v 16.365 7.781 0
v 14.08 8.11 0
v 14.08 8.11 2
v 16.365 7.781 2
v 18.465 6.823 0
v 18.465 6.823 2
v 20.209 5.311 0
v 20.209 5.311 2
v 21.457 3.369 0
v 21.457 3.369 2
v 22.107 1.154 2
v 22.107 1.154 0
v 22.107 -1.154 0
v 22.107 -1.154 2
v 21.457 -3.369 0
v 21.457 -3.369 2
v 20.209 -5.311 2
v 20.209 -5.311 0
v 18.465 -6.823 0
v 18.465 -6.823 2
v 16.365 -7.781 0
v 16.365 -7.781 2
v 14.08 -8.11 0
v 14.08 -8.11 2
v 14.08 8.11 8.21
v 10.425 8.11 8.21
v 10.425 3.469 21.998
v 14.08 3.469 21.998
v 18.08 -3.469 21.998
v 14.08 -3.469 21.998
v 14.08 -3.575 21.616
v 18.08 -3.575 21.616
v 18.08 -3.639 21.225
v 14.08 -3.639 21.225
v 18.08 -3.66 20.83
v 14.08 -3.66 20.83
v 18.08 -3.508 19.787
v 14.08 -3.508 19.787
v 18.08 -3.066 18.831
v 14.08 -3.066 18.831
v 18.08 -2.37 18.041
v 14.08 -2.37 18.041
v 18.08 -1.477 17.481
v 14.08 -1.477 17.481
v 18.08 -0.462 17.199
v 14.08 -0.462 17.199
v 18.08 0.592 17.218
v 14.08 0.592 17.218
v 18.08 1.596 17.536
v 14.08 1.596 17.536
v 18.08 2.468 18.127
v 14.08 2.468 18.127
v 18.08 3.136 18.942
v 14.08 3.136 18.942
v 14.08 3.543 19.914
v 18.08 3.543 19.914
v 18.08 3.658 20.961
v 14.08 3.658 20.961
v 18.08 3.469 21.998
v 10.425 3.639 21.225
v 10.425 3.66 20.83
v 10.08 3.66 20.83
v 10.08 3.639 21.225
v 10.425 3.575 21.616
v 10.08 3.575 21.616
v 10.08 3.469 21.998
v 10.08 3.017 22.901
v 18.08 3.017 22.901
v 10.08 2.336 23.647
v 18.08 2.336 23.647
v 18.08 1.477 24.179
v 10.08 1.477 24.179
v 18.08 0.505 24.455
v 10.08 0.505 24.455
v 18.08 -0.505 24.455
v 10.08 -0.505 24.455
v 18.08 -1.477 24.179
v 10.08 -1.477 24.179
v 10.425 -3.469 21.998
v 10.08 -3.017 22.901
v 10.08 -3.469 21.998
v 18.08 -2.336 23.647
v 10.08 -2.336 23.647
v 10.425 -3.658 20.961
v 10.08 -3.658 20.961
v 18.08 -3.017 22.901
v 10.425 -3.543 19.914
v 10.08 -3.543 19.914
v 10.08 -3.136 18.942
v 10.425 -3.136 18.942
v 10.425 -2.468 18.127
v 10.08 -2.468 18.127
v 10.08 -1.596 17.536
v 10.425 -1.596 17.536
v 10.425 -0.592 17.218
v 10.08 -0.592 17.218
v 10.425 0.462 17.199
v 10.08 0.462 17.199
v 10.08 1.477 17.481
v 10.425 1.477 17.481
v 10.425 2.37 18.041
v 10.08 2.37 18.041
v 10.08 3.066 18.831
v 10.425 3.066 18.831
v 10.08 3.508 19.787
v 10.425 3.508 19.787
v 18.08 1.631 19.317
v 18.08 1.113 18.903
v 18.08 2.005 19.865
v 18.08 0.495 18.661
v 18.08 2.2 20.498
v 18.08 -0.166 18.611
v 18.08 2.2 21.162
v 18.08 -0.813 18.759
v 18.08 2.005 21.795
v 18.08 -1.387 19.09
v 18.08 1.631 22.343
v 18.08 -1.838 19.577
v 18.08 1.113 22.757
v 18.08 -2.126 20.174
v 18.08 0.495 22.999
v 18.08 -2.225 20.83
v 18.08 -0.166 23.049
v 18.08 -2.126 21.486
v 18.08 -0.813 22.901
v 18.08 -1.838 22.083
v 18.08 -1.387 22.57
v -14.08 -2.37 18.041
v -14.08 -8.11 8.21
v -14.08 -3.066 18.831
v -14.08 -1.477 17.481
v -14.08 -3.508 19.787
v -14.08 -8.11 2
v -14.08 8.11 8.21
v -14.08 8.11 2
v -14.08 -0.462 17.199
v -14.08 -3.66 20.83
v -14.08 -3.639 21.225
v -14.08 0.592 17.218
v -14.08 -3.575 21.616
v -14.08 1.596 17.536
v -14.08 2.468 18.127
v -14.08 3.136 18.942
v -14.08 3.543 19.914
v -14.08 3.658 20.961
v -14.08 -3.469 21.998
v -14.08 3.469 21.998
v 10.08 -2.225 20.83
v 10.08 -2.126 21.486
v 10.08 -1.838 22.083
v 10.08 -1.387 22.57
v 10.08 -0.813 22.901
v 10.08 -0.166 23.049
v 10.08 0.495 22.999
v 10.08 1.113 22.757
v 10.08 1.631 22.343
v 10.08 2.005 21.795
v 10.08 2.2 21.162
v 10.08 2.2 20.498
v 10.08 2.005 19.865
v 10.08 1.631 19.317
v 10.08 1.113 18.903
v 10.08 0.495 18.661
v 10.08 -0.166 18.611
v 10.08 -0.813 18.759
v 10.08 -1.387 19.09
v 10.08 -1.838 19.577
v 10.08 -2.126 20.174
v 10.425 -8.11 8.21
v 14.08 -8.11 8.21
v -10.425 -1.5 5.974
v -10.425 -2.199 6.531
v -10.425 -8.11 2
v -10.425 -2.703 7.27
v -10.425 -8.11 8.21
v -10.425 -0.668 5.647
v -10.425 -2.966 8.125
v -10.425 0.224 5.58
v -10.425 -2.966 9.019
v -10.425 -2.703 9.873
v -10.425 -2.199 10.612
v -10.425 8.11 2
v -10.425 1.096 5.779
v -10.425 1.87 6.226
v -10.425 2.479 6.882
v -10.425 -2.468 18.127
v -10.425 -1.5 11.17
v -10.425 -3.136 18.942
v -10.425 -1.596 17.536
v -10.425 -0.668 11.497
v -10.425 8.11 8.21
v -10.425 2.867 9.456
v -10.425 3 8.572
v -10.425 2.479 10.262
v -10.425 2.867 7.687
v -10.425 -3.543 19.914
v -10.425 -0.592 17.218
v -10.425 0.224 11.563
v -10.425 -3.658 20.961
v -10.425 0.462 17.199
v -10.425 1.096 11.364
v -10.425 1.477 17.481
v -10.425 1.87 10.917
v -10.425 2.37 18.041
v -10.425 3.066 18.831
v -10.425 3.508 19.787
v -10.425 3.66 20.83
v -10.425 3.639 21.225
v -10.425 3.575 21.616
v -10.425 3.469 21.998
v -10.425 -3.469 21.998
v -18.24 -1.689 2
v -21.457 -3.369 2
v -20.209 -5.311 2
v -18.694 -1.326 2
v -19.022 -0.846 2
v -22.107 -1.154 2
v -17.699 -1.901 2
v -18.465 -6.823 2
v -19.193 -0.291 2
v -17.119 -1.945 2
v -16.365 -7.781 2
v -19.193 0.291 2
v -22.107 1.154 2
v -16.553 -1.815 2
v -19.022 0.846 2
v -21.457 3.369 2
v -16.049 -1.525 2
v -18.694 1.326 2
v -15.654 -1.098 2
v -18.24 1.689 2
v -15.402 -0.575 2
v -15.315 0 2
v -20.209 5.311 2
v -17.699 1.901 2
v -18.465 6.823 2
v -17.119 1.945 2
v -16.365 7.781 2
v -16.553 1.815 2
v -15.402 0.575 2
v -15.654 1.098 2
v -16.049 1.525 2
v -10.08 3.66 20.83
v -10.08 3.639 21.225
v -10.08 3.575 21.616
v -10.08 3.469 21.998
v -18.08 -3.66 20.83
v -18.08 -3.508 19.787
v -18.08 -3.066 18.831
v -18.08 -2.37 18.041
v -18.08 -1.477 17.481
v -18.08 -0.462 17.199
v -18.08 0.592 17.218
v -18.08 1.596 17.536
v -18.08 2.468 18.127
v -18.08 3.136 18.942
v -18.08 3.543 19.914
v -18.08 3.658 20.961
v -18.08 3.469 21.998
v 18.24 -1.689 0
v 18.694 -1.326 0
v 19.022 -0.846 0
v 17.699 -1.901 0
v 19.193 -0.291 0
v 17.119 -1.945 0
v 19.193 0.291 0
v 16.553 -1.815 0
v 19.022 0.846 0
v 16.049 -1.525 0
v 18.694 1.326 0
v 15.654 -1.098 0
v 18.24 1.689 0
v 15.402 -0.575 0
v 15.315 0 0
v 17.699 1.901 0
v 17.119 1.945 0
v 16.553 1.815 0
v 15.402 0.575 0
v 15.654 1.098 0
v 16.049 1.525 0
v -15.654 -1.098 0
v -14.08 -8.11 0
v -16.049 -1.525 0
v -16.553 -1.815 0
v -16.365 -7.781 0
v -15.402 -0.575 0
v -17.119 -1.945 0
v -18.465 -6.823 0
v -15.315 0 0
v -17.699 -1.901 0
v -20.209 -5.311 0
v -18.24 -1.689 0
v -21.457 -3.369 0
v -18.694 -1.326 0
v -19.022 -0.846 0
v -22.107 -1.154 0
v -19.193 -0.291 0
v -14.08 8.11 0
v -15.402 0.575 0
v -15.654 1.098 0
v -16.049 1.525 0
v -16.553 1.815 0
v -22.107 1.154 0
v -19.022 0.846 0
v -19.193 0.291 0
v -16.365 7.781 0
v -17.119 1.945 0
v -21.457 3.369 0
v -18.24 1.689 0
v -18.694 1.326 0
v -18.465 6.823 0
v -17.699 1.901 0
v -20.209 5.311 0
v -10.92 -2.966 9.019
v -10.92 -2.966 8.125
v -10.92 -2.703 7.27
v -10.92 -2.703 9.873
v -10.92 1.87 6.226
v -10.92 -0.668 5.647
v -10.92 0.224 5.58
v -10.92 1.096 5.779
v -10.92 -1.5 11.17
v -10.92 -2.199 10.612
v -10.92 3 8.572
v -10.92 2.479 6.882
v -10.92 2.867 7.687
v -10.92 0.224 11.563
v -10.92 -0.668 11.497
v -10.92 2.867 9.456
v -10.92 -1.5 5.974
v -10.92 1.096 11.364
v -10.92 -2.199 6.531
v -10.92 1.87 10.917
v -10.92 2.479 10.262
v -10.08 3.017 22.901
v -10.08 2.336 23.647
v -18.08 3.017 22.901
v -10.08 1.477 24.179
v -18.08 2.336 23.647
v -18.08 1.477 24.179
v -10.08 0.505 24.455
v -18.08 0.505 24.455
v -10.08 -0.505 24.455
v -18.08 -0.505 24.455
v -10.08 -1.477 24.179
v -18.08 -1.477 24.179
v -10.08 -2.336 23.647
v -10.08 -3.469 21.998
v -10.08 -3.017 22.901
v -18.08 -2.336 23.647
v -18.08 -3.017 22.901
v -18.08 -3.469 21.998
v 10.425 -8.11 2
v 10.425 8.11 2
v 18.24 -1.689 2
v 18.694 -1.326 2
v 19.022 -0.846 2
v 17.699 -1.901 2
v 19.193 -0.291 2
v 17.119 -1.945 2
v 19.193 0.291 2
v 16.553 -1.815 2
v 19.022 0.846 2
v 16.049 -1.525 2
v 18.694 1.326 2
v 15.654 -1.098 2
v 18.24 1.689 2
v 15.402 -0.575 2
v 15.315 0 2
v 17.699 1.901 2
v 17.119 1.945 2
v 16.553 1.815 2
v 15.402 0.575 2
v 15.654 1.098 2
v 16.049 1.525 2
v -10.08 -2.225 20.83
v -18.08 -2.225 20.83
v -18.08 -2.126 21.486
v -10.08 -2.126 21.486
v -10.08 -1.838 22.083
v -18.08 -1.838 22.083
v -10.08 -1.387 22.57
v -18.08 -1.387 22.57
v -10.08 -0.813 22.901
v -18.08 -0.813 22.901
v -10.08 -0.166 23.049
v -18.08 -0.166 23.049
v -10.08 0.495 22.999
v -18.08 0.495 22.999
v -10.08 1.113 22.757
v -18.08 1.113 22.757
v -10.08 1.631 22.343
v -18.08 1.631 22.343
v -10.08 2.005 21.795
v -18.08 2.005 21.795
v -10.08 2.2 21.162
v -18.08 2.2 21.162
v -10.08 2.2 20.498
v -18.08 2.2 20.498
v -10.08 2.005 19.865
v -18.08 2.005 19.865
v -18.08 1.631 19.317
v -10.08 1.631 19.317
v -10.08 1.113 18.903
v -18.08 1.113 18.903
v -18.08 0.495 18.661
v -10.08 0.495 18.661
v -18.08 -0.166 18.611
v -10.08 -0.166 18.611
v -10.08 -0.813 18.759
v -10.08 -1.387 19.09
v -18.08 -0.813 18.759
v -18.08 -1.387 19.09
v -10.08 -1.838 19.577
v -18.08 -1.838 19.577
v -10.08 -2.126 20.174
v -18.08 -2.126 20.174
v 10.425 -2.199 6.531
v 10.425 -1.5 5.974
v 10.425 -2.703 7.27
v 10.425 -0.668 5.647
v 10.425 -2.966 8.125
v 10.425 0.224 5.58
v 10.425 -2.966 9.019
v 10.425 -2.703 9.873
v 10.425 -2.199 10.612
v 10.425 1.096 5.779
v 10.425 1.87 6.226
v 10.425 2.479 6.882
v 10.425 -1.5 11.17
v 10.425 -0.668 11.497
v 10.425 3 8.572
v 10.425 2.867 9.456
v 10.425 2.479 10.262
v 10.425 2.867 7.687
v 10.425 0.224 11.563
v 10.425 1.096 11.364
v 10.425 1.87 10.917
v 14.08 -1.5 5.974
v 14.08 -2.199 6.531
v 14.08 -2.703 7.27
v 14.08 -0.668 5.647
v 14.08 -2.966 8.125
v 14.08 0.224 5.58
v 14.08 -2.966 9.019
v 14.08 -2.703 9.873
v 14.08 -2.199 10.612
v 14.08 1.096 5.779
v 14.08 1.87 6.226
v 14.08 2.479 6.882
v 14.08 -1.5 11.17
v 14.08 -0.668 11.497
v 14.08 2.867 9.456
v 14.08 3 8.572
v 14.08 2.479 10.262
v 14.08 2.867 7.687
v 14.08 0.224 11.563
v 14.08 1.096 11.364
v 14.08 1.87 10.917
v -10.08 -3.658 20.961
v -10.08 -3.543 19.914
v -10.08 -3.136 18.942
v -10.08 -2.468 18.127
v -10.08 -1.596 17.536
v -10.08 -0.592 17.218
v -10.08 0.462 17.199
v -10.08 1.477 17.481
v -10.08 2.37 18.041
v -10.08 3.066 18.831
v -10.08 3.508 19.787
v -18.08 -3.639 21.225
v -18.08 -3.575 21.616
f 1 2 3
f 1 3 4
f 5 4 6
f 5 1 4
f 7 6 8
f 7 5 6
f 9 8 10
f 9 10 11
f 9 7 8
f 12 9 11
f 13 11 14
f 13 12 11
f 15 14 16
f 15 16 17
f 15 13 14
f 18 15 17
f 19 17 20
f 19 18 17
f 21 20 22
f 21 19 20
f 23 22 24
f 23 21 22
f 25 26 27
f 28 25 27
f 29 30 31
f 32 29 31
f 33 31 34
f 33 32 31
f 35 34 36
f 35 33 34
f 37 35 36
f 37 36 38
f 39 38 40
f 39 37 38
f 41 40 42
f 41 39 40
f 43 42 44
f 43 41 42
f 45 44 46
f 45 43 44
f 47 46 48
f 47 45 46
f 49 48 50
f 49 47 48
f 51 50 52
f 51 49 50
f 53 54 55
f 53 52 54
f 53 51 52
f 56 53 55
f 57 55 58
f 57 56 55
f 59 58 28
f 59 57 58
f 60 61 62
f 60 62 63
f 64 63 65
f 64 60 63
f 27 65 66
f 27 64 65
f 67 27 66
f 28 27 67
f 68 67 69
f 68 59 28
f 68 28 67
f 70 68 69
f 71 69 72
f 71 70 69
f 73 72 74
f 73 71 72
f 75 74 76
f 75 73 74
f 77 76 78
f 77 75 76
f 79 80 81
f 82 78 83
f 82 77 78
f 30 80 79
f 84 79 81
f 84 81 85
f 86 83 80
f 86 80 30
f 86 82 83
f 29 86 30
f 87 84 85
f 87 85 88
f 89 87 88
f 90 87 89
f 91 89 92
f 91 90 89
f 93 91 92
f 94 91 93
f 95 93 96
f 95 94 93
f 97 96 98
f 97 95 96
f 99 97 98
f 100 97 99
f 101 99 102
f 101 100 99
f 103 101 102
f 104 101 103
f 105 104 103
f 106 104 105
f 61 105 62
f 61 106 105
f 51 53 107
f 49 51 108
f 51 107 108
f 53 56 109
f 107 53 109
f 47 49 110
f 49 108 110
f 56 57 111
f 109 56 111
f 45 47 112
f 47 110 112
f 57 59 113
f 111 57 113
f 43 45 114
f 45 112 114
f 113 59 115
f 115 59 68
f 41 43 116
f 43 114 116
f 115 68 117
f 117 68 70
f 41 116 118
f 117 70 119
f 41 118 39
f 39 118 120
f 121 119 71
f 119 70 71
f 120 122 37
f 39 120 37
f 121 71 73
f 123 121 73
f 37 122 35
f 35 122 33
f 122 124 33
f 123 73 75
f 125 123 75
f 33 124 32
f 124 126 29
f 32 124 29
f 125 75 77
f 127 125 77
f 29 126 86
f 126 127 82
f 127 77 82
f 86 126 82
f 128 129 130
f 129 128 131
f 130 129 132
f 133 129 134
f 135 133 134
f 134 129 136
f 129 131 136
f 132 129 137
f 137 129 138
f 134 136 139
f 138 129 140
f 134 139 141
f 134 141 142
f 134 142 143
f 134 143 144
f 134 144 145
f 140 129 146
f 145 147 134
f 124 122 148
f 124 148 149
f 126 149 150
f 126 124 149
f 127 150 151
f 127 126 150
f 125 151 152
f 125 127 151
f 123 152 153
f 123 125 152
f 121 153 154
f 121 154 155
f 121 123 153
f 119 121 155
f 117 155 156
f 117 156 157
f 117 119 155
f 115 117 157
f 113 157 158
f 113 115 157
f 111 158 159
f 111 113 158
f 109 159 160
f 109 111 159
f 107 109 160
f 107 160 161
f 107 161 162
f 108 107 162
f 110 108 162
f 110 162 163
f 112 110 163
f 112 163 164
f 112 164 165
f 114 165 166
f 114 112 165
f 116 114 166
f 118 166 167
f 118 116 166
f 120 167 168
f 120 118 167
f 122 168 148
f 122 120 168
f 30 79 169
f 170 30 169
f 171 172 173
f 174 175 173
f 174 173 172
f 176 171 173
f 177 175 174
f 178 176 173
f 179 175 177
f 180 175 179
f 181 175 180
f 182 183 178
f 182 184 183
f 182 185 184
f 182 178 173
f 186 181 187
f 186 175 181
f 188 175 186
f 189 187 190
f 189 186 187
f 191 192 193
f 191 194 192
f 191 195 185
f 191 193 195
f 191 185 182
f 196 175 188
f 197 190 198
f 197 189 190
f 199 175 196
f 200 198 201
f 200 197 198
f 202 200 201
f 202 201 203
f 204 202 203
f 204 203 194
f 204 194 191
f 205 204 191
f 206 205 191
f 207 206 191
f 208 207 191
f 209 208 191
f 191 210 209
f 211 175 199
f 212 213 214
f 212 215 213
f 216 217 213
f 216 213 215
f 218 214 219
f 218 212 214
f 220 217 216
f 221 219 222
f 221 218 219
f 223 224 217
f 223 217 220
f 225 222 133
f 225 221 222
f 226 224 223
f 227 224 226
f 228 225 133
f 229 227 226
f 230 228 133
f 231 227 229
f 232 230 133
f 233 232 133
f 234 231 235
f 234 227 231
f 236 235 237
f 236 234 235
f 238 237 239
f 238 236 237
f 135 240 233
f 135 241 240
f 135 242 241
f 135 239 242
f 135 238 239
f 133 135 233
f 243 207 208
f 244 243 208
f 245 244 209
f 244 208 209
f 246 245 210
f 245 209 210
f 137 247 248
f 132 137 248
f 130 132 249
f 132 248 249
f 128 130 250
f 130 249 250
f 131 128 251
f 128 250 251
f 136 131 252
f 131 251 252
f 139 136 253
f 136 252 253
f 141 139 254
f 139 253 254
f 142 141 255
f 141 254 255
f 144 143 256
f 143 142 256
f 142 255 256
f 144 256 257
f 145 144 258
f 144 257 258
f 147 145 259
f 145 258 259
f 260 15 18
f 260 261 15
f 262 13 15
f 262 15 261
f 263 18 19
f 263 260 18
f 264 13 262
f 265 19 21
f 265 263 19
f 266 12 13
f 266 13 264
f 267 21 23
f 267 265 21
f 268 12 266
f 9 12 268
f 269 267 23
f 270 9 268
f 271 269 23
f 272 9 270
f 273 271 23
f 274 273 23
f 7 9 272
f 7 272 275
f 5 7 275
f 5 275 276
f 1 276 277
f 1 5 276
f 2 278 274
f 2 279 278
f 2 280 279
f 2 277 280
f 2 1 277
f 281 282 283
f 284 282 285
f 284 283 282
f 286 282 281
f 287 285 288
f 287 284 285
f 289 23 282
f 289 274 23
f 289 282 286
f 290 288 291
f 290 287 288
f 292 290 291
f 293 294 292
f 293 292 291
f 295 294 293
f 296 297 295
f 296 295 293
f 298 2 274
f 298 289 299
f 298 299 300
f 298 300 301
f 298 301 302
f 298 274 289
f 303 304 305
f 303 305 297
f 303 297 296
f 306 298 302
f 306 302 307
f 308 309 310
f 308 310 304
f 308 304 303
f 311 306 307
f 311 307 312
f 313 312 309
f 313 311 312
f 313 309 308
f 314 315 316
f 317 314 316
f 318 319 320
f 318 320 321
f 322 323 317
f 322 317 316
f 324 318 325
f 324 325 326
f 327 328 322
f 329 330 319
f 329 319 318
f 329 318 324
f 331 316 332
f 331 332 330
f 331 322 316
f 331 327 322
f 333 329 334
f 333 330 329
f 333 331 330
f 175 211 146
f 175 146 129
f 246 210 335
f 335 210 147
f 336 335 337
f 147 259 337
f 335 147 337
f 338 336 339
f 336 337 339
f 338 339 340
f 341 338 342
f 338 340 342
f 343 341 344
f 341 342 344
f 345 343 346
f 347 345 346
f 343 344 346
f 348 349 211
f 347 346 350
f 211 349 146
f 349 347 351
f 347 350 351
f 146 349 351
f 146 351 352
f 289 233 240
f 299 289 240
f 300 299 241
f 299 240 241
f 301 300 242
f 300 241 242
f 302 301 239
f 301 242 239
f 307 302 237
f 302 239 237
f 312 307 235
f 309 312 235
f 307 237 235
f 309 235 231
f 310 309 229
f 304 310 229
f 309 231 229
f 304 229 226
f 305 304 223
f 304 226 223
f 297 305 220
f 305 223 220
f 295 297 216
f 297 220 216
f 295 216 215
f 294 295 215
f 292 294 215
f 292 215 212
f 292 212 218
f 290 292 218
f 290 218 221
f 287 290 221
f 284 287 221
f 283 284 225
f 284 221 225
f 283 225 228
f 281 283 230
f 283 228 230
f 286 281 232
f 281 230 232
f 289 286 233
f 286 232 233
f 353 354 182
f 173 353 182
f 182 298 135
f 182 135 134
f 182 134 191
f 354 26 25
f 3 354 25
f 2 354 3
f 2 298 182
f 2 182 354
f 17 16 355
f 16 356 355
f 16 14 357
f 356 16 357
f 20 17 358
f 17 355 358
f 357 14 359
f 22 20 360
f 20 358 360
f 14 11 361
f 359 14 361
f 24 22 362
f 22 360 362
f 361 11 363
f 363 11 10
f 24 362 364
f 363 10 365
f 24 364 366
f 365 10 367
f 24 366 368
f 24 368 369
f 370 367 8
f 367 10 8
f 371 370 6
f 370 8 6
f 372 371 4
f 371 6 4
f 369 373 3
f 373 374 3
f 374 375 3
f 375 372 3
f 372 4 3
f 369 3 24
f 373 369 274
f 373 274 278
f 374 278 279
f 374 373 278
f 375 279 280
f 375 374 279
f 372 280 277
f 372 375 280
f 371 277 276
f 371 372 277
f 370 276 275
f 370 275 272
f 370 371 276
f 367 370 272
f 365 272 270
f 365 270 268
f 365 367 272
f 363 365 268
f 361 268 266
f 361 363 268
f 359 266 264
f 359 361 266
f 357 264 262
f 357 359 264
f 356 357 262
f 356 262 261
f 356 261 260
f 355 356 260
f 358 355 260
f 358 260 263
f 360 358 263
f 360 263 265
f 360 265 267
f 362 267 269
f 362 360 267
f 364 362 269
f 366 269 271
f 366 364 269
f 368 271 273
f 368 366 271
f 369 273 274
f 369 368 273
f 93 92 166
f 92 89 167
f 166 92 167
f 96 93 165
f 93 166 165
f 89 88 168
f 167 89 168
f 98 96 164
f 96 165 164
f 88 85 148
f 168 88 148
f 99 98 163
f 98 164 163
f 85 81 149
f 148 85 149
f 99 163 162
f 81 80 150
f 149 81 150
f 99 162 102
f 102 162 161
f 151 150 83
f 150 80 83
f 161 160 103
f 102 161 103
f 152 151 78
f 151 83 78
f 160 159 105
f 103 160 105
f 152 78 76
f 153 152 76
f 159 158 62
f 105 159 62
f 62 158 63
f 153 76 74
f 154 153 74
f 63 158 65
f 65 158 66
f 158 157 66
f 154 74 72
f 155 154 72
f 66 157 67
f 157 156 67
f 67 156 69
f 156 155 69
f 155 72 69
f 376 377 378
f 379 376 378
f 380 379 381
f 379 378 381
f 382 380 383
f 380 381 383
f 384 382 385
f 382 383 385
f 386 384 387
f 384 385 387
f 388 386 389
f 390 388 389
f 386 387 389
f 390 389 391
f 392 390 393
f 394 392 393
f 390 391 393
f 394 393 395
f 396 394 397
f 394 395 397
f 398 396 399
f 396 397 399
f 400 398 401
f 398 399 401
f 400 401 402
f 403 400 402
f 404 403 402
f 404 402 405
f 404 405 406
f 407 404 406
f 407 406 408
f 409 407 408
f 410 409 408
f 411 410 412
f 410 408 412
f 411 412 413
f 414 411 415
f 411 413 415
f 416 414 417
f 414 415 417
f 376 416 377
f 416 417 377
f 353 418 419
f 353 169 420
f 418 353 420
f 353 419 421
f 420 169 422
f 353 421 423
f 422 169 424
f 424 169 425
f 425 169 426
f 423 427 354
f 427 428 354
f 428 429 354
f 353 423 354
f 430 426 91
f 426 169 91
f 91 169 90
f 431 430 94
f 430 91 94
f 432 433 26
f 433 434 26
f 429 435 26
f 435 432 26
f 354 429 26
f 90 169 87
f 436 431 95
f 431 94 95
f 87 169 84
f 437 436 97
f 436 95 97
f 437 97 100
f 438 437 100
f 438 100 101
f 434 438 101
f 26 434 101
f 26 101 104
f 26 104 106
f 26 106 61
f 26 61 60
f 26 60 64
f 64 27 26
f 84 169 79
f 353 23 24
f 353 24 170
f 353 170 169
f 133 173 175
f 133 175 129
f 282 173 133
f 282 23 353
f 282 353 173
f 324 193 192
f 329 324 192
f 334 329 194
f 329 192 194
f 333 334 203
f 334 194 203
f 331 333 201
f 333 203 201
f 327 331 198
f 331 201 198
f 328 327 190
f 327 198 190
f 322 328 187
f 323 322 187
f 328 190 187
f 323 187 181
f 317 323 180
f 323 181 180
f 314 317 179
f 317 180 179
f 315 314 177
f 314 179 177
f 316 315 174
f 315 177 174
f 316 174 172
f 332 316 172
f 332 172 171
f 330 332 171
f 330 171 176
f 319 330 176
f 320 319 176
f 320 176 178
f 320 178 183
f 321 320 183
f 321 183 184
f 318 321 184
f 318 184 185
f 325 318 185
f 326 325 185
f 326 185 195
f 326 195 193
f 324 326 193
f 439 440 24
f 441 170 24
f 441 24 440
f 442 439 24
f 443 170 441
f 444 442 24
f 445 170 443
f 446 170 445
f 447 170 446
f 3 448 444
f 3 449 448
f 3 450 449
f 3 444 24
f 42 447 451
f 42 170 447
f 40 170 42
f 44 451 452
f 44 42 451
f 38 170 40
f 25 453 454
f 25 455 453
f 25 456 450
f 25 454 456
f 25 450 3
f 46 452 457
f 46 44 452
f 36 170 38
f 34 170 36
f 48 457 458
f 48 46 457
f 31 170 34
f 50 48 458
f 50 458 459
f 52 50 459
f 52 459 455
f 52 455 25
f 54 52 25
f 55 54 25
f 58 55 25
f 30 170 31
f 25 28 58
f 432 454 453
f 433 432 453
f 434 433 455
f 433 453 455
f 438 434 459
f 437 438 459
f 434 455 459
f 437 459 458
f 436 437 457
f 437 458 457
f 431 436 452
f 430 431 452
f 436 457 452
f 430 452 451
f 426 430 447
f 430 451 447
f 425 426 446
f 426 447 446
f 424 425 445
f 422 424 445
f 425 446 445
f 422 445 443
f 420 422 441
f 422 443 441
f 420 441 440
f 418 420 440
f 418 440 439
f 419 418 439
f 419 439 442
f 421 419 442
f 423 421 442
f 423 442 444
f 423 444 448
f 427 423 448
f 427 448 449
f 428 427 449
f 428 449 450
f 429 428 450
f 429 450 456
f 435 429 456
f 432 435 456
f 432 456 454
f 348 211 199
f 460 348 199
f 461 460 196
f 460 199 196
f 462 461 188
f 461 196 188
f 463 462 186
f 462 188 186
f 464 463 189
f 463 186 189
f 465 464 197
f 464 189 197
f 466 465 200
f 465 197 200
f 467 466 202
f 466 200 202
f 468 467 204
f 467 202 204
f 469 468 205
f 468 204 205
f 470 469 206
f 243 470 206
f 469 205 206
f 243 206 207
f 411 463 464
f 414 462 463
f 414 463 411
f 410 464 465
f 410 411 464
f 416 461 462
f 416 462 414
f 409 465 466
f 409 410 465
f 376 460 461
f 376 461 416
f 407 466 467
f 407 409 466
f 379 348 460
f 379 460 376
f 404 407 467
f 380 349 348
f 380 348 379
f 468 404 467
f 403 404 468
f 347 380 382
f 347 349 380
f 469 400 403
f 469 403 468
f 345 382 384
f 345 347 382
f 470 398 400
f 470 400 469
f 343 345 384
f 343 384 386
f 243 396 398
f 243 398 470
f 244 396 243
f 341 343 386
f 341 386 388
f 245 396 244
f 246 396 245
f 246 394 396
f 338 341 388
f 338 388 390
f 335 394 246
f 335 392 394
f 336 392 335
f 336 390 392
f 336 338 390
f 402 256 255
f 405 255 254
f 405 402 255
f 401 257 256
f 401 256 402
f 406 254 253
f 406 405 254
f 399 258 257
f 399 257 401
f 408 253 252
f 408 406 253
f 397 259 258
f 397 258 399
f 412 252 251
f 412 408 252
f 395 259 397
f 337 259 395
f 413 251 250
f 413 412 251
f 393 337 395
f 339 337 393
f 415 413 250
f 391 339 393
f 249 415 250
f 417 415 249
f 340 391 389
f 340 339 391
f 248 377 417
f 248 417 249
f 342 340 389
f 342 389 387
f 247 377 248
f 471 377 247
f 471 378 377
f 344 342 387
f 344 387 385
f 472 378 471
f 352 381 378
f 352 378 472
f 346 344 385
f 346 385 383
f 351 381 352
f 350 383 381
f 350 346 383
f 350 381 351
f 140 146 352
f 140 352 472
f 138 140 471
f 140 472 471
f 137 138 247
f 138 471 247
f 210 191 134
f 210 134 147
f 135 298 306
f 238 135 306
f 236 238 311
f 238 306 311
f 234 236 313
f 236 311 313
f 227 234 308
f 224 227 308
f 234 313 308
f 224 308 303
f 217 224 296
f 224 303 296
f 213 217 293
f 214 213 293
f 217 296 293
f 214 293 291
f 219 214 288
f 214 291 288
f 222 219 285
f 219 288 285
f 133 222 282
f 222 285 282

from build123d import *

# Parameters (mm, degrees)
F1_DEPTH  = 2
F3_DEPTH  = 14.08
F4_DEPTH  = 10.425
F6_DEPTH  = 4
F8_DEPTH  = 0.345
F9_R      = 2.225
F10_DEPTH = 8
F11_R     = 1.95
F12_DEPTH = 2
F14_DEPTH = 2
F16_R     = 3
F17_DEPTH = 25


with BuildPart() as f1:
    # F0 (on Top) → F1 (new body)
    with BuildSketch(Plane.XY):
        with BuildLine():
            Line((-14.08, -8.11), (0, -8.11))
            Line((0, -8.11), (0, 0))
            Line((0, 0), (0, 8.11))
            Line((0, 8.11), (-14.08, 8.11))
            ThreePointArc((-14.08, 8.11), (-22.19, 0), (-14.08, -8.11))
        make_face()
    extrude(amount=F1_DEPTH)

    # F2 (on Right) → F3 (join)
    with BuildSketch(Plane.YZ):
        with BuildLine():
            Line((-8.11, 8.21), (-8.11, 2))
            Line((-8.11, 2), (8.11, 2))
            Line((8.11, 2), (8.11, 8.21))
            Line((8.11, 8.21), (3.4687412656, 21.99766178))
            ThreePointArc((3.4687412656, 21.99766178), (0, 24.49), (-3.4687412656, 21.99766178))
            Line((-3.4687412656, 21.99766178), (-8.11, 8.21))
        make_face()
    extrude(amount=-F3_DEPTH)

    # F4 (cut): a face of the model
    f4_faces = [f1.faces().sort_by_distance(p)[0] for p in [
        (0, 0, 10.1553909867),
    ]]
    extrude(f4_faces, amount=-F4_DEPTH, mode=Mode.SUBTRACT)

    # F5 (on face) → F6 (join)
    with BuildSketch(Plane(origin=(-14.08, 0, 0), x_dir=(0, -1, 0), z_dir=(-1, 0, 0))):
        with BuildLine():
            ThreePointArc((-3.4687412656, 21.99766178), (-0.5916109228, 17.2181311602), (3.66, 20.83))
            ThreePointArc((3.66, 20.83), (3.6118688398, 21.4216109228), (3.4687412656, 21.99766178))
            ThreePointArc((3.4687412656, 21.99766178), (0, 24.49), (-3.4687412656, 21.99766178))
        make_face()
    extrude(amount=F6_DEPTH)

    # F7 (on face) → F8 (join)
    with BuildSketch(Plane.YZ.offset(-10.425)):
        with BuildLine():
            ThreePointArc((-3.4687412656, 21.99766178), (-0.5916109228, 17.2181311602), (3.66, 20.83))
            ThreePointArc((3.66, 20.83), (3.6118688398, 21.4216109228), (3.4687412656, 21.99766178))
            ThreePointArc((3.4687412656, 21.99766178), (0, 24.49), (-3.4687412656, 21.99766178))
        make_face()
    extrude(amount=F8_DEPTH)

    # F9 (on face) → F10 (cut)
    with BuildSketch(Plane(origin=(-18.08, 0, 0), x_dir=(0, -1, 0), z_dir=(-1, 0, 0))):
        with Locations((0, 20.83)):
            Circle(F9_R)
    extrude(amount=-F10_DEPTH, mode=Mode.SUBTRACT)

    # F11 (on face) → F12 (cut)
    with BuildSketch(Plane.XY.offset(2)):
        with Locations((-17.265, 0)):
            Circle(F11_R)
    extrude(amount=-F12_DEPTH, mode=Mode.SUBTRACT)

    # F13 (on face) → F14 (join)
    with BuildSketch(Plane.XY):
        Polygon((-10.425, 8.11), (-10.425, -8.11), (0, -8.11), (0, 0), (0, 8.11), align=None)
    extrude(amount=F14_DEPTH)

    # F15: F1 across plane


with BuildPart() as f1_1:
    add(f1.part)
    add(f1.part.mirror(Plane.YZ))

    # F16 (on face) → F17 (cut)
    with BuildSketch(Plane.YZ.offset(14.08)):
        with Locations((0, 8.5717271108)):
            Circle(F16_R)
    extrude(amount=-F17_DEPTH, mode=Mode.SUBTRACT)


solid = f1_1.part
